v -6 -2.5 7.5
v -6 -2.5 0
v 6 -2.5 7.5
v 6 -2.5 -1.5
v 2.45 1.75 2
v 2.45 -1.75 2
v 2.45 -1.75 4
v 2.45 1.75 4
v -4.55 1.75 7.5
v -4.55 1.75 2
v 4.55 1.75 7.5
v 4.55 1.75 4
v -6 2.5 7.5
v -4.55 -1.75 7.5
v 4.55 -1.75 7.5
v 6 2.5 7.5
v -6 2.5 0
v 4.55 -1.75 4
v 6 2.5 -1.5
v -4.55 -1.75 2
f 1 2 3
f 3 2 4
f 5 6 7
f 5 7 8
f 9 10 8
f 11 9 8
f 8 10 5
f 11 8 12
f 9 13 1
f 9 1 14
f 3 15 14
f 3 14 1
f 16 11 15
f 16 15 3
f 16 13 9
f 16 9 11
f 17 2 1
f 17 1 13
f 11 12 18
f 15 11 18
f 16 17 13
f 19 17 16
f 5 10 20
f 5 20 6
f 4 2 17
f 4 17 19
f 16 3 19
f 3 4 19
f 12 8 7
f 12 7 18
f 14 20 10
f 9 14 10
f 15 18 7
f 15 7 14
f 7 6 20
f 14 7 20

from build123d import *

# Parameters (mm, degrees)
F0_W     = 7
F0_H     = 3.5
F1_DEPTH = 2
F0_W_2   = 12
F0_H_2   = 5
F2_DEPTH = 7.5
F4_DEPTH = 2.5
F0_W_3   = 2.1
F5_DEPTH = 4


with BuildPart() as f1:
    # F0 (on Top) → F1 (new body)
    with BuildSketch(Plane.XY):
        with Locations((-1.05, 0)):
            Rectangle(F0_W, F0_H)
    extrude(amount=F1_DEPTH)

    # F0 (on Top) → F2 (join)
    with BuildSketch(Plane.XY):
        Rectangle(F0_W_2, F0_H_2)
        Polygon((2.45, 1.75), (4.55, 1.75), (4.55, -1.75), (2.45, -1.75), (-4.55, -1.75), (-4.55, 1.75), align=None, mode=Mode.SUBTRACT)
    extrude(amount=F2_DEPTH)

    # F3 (on Front) → F4 (join, symmetric)
    with BuildSketch(Plane.XZ):
        Polygon((6, 0), (-6, 0), (6, -1.5), align=None)
    extrude(amount=F4_DEPTH, both=True)

    # F0 (on Top) → F5 (join)
    with BuildSketch(Plane.XY):
        with Locations((3.5, 0)):
            Rectangle(F0_W_3, F0_H)
    extrude(amount=F5_DEPTH)


solid = f1.part
